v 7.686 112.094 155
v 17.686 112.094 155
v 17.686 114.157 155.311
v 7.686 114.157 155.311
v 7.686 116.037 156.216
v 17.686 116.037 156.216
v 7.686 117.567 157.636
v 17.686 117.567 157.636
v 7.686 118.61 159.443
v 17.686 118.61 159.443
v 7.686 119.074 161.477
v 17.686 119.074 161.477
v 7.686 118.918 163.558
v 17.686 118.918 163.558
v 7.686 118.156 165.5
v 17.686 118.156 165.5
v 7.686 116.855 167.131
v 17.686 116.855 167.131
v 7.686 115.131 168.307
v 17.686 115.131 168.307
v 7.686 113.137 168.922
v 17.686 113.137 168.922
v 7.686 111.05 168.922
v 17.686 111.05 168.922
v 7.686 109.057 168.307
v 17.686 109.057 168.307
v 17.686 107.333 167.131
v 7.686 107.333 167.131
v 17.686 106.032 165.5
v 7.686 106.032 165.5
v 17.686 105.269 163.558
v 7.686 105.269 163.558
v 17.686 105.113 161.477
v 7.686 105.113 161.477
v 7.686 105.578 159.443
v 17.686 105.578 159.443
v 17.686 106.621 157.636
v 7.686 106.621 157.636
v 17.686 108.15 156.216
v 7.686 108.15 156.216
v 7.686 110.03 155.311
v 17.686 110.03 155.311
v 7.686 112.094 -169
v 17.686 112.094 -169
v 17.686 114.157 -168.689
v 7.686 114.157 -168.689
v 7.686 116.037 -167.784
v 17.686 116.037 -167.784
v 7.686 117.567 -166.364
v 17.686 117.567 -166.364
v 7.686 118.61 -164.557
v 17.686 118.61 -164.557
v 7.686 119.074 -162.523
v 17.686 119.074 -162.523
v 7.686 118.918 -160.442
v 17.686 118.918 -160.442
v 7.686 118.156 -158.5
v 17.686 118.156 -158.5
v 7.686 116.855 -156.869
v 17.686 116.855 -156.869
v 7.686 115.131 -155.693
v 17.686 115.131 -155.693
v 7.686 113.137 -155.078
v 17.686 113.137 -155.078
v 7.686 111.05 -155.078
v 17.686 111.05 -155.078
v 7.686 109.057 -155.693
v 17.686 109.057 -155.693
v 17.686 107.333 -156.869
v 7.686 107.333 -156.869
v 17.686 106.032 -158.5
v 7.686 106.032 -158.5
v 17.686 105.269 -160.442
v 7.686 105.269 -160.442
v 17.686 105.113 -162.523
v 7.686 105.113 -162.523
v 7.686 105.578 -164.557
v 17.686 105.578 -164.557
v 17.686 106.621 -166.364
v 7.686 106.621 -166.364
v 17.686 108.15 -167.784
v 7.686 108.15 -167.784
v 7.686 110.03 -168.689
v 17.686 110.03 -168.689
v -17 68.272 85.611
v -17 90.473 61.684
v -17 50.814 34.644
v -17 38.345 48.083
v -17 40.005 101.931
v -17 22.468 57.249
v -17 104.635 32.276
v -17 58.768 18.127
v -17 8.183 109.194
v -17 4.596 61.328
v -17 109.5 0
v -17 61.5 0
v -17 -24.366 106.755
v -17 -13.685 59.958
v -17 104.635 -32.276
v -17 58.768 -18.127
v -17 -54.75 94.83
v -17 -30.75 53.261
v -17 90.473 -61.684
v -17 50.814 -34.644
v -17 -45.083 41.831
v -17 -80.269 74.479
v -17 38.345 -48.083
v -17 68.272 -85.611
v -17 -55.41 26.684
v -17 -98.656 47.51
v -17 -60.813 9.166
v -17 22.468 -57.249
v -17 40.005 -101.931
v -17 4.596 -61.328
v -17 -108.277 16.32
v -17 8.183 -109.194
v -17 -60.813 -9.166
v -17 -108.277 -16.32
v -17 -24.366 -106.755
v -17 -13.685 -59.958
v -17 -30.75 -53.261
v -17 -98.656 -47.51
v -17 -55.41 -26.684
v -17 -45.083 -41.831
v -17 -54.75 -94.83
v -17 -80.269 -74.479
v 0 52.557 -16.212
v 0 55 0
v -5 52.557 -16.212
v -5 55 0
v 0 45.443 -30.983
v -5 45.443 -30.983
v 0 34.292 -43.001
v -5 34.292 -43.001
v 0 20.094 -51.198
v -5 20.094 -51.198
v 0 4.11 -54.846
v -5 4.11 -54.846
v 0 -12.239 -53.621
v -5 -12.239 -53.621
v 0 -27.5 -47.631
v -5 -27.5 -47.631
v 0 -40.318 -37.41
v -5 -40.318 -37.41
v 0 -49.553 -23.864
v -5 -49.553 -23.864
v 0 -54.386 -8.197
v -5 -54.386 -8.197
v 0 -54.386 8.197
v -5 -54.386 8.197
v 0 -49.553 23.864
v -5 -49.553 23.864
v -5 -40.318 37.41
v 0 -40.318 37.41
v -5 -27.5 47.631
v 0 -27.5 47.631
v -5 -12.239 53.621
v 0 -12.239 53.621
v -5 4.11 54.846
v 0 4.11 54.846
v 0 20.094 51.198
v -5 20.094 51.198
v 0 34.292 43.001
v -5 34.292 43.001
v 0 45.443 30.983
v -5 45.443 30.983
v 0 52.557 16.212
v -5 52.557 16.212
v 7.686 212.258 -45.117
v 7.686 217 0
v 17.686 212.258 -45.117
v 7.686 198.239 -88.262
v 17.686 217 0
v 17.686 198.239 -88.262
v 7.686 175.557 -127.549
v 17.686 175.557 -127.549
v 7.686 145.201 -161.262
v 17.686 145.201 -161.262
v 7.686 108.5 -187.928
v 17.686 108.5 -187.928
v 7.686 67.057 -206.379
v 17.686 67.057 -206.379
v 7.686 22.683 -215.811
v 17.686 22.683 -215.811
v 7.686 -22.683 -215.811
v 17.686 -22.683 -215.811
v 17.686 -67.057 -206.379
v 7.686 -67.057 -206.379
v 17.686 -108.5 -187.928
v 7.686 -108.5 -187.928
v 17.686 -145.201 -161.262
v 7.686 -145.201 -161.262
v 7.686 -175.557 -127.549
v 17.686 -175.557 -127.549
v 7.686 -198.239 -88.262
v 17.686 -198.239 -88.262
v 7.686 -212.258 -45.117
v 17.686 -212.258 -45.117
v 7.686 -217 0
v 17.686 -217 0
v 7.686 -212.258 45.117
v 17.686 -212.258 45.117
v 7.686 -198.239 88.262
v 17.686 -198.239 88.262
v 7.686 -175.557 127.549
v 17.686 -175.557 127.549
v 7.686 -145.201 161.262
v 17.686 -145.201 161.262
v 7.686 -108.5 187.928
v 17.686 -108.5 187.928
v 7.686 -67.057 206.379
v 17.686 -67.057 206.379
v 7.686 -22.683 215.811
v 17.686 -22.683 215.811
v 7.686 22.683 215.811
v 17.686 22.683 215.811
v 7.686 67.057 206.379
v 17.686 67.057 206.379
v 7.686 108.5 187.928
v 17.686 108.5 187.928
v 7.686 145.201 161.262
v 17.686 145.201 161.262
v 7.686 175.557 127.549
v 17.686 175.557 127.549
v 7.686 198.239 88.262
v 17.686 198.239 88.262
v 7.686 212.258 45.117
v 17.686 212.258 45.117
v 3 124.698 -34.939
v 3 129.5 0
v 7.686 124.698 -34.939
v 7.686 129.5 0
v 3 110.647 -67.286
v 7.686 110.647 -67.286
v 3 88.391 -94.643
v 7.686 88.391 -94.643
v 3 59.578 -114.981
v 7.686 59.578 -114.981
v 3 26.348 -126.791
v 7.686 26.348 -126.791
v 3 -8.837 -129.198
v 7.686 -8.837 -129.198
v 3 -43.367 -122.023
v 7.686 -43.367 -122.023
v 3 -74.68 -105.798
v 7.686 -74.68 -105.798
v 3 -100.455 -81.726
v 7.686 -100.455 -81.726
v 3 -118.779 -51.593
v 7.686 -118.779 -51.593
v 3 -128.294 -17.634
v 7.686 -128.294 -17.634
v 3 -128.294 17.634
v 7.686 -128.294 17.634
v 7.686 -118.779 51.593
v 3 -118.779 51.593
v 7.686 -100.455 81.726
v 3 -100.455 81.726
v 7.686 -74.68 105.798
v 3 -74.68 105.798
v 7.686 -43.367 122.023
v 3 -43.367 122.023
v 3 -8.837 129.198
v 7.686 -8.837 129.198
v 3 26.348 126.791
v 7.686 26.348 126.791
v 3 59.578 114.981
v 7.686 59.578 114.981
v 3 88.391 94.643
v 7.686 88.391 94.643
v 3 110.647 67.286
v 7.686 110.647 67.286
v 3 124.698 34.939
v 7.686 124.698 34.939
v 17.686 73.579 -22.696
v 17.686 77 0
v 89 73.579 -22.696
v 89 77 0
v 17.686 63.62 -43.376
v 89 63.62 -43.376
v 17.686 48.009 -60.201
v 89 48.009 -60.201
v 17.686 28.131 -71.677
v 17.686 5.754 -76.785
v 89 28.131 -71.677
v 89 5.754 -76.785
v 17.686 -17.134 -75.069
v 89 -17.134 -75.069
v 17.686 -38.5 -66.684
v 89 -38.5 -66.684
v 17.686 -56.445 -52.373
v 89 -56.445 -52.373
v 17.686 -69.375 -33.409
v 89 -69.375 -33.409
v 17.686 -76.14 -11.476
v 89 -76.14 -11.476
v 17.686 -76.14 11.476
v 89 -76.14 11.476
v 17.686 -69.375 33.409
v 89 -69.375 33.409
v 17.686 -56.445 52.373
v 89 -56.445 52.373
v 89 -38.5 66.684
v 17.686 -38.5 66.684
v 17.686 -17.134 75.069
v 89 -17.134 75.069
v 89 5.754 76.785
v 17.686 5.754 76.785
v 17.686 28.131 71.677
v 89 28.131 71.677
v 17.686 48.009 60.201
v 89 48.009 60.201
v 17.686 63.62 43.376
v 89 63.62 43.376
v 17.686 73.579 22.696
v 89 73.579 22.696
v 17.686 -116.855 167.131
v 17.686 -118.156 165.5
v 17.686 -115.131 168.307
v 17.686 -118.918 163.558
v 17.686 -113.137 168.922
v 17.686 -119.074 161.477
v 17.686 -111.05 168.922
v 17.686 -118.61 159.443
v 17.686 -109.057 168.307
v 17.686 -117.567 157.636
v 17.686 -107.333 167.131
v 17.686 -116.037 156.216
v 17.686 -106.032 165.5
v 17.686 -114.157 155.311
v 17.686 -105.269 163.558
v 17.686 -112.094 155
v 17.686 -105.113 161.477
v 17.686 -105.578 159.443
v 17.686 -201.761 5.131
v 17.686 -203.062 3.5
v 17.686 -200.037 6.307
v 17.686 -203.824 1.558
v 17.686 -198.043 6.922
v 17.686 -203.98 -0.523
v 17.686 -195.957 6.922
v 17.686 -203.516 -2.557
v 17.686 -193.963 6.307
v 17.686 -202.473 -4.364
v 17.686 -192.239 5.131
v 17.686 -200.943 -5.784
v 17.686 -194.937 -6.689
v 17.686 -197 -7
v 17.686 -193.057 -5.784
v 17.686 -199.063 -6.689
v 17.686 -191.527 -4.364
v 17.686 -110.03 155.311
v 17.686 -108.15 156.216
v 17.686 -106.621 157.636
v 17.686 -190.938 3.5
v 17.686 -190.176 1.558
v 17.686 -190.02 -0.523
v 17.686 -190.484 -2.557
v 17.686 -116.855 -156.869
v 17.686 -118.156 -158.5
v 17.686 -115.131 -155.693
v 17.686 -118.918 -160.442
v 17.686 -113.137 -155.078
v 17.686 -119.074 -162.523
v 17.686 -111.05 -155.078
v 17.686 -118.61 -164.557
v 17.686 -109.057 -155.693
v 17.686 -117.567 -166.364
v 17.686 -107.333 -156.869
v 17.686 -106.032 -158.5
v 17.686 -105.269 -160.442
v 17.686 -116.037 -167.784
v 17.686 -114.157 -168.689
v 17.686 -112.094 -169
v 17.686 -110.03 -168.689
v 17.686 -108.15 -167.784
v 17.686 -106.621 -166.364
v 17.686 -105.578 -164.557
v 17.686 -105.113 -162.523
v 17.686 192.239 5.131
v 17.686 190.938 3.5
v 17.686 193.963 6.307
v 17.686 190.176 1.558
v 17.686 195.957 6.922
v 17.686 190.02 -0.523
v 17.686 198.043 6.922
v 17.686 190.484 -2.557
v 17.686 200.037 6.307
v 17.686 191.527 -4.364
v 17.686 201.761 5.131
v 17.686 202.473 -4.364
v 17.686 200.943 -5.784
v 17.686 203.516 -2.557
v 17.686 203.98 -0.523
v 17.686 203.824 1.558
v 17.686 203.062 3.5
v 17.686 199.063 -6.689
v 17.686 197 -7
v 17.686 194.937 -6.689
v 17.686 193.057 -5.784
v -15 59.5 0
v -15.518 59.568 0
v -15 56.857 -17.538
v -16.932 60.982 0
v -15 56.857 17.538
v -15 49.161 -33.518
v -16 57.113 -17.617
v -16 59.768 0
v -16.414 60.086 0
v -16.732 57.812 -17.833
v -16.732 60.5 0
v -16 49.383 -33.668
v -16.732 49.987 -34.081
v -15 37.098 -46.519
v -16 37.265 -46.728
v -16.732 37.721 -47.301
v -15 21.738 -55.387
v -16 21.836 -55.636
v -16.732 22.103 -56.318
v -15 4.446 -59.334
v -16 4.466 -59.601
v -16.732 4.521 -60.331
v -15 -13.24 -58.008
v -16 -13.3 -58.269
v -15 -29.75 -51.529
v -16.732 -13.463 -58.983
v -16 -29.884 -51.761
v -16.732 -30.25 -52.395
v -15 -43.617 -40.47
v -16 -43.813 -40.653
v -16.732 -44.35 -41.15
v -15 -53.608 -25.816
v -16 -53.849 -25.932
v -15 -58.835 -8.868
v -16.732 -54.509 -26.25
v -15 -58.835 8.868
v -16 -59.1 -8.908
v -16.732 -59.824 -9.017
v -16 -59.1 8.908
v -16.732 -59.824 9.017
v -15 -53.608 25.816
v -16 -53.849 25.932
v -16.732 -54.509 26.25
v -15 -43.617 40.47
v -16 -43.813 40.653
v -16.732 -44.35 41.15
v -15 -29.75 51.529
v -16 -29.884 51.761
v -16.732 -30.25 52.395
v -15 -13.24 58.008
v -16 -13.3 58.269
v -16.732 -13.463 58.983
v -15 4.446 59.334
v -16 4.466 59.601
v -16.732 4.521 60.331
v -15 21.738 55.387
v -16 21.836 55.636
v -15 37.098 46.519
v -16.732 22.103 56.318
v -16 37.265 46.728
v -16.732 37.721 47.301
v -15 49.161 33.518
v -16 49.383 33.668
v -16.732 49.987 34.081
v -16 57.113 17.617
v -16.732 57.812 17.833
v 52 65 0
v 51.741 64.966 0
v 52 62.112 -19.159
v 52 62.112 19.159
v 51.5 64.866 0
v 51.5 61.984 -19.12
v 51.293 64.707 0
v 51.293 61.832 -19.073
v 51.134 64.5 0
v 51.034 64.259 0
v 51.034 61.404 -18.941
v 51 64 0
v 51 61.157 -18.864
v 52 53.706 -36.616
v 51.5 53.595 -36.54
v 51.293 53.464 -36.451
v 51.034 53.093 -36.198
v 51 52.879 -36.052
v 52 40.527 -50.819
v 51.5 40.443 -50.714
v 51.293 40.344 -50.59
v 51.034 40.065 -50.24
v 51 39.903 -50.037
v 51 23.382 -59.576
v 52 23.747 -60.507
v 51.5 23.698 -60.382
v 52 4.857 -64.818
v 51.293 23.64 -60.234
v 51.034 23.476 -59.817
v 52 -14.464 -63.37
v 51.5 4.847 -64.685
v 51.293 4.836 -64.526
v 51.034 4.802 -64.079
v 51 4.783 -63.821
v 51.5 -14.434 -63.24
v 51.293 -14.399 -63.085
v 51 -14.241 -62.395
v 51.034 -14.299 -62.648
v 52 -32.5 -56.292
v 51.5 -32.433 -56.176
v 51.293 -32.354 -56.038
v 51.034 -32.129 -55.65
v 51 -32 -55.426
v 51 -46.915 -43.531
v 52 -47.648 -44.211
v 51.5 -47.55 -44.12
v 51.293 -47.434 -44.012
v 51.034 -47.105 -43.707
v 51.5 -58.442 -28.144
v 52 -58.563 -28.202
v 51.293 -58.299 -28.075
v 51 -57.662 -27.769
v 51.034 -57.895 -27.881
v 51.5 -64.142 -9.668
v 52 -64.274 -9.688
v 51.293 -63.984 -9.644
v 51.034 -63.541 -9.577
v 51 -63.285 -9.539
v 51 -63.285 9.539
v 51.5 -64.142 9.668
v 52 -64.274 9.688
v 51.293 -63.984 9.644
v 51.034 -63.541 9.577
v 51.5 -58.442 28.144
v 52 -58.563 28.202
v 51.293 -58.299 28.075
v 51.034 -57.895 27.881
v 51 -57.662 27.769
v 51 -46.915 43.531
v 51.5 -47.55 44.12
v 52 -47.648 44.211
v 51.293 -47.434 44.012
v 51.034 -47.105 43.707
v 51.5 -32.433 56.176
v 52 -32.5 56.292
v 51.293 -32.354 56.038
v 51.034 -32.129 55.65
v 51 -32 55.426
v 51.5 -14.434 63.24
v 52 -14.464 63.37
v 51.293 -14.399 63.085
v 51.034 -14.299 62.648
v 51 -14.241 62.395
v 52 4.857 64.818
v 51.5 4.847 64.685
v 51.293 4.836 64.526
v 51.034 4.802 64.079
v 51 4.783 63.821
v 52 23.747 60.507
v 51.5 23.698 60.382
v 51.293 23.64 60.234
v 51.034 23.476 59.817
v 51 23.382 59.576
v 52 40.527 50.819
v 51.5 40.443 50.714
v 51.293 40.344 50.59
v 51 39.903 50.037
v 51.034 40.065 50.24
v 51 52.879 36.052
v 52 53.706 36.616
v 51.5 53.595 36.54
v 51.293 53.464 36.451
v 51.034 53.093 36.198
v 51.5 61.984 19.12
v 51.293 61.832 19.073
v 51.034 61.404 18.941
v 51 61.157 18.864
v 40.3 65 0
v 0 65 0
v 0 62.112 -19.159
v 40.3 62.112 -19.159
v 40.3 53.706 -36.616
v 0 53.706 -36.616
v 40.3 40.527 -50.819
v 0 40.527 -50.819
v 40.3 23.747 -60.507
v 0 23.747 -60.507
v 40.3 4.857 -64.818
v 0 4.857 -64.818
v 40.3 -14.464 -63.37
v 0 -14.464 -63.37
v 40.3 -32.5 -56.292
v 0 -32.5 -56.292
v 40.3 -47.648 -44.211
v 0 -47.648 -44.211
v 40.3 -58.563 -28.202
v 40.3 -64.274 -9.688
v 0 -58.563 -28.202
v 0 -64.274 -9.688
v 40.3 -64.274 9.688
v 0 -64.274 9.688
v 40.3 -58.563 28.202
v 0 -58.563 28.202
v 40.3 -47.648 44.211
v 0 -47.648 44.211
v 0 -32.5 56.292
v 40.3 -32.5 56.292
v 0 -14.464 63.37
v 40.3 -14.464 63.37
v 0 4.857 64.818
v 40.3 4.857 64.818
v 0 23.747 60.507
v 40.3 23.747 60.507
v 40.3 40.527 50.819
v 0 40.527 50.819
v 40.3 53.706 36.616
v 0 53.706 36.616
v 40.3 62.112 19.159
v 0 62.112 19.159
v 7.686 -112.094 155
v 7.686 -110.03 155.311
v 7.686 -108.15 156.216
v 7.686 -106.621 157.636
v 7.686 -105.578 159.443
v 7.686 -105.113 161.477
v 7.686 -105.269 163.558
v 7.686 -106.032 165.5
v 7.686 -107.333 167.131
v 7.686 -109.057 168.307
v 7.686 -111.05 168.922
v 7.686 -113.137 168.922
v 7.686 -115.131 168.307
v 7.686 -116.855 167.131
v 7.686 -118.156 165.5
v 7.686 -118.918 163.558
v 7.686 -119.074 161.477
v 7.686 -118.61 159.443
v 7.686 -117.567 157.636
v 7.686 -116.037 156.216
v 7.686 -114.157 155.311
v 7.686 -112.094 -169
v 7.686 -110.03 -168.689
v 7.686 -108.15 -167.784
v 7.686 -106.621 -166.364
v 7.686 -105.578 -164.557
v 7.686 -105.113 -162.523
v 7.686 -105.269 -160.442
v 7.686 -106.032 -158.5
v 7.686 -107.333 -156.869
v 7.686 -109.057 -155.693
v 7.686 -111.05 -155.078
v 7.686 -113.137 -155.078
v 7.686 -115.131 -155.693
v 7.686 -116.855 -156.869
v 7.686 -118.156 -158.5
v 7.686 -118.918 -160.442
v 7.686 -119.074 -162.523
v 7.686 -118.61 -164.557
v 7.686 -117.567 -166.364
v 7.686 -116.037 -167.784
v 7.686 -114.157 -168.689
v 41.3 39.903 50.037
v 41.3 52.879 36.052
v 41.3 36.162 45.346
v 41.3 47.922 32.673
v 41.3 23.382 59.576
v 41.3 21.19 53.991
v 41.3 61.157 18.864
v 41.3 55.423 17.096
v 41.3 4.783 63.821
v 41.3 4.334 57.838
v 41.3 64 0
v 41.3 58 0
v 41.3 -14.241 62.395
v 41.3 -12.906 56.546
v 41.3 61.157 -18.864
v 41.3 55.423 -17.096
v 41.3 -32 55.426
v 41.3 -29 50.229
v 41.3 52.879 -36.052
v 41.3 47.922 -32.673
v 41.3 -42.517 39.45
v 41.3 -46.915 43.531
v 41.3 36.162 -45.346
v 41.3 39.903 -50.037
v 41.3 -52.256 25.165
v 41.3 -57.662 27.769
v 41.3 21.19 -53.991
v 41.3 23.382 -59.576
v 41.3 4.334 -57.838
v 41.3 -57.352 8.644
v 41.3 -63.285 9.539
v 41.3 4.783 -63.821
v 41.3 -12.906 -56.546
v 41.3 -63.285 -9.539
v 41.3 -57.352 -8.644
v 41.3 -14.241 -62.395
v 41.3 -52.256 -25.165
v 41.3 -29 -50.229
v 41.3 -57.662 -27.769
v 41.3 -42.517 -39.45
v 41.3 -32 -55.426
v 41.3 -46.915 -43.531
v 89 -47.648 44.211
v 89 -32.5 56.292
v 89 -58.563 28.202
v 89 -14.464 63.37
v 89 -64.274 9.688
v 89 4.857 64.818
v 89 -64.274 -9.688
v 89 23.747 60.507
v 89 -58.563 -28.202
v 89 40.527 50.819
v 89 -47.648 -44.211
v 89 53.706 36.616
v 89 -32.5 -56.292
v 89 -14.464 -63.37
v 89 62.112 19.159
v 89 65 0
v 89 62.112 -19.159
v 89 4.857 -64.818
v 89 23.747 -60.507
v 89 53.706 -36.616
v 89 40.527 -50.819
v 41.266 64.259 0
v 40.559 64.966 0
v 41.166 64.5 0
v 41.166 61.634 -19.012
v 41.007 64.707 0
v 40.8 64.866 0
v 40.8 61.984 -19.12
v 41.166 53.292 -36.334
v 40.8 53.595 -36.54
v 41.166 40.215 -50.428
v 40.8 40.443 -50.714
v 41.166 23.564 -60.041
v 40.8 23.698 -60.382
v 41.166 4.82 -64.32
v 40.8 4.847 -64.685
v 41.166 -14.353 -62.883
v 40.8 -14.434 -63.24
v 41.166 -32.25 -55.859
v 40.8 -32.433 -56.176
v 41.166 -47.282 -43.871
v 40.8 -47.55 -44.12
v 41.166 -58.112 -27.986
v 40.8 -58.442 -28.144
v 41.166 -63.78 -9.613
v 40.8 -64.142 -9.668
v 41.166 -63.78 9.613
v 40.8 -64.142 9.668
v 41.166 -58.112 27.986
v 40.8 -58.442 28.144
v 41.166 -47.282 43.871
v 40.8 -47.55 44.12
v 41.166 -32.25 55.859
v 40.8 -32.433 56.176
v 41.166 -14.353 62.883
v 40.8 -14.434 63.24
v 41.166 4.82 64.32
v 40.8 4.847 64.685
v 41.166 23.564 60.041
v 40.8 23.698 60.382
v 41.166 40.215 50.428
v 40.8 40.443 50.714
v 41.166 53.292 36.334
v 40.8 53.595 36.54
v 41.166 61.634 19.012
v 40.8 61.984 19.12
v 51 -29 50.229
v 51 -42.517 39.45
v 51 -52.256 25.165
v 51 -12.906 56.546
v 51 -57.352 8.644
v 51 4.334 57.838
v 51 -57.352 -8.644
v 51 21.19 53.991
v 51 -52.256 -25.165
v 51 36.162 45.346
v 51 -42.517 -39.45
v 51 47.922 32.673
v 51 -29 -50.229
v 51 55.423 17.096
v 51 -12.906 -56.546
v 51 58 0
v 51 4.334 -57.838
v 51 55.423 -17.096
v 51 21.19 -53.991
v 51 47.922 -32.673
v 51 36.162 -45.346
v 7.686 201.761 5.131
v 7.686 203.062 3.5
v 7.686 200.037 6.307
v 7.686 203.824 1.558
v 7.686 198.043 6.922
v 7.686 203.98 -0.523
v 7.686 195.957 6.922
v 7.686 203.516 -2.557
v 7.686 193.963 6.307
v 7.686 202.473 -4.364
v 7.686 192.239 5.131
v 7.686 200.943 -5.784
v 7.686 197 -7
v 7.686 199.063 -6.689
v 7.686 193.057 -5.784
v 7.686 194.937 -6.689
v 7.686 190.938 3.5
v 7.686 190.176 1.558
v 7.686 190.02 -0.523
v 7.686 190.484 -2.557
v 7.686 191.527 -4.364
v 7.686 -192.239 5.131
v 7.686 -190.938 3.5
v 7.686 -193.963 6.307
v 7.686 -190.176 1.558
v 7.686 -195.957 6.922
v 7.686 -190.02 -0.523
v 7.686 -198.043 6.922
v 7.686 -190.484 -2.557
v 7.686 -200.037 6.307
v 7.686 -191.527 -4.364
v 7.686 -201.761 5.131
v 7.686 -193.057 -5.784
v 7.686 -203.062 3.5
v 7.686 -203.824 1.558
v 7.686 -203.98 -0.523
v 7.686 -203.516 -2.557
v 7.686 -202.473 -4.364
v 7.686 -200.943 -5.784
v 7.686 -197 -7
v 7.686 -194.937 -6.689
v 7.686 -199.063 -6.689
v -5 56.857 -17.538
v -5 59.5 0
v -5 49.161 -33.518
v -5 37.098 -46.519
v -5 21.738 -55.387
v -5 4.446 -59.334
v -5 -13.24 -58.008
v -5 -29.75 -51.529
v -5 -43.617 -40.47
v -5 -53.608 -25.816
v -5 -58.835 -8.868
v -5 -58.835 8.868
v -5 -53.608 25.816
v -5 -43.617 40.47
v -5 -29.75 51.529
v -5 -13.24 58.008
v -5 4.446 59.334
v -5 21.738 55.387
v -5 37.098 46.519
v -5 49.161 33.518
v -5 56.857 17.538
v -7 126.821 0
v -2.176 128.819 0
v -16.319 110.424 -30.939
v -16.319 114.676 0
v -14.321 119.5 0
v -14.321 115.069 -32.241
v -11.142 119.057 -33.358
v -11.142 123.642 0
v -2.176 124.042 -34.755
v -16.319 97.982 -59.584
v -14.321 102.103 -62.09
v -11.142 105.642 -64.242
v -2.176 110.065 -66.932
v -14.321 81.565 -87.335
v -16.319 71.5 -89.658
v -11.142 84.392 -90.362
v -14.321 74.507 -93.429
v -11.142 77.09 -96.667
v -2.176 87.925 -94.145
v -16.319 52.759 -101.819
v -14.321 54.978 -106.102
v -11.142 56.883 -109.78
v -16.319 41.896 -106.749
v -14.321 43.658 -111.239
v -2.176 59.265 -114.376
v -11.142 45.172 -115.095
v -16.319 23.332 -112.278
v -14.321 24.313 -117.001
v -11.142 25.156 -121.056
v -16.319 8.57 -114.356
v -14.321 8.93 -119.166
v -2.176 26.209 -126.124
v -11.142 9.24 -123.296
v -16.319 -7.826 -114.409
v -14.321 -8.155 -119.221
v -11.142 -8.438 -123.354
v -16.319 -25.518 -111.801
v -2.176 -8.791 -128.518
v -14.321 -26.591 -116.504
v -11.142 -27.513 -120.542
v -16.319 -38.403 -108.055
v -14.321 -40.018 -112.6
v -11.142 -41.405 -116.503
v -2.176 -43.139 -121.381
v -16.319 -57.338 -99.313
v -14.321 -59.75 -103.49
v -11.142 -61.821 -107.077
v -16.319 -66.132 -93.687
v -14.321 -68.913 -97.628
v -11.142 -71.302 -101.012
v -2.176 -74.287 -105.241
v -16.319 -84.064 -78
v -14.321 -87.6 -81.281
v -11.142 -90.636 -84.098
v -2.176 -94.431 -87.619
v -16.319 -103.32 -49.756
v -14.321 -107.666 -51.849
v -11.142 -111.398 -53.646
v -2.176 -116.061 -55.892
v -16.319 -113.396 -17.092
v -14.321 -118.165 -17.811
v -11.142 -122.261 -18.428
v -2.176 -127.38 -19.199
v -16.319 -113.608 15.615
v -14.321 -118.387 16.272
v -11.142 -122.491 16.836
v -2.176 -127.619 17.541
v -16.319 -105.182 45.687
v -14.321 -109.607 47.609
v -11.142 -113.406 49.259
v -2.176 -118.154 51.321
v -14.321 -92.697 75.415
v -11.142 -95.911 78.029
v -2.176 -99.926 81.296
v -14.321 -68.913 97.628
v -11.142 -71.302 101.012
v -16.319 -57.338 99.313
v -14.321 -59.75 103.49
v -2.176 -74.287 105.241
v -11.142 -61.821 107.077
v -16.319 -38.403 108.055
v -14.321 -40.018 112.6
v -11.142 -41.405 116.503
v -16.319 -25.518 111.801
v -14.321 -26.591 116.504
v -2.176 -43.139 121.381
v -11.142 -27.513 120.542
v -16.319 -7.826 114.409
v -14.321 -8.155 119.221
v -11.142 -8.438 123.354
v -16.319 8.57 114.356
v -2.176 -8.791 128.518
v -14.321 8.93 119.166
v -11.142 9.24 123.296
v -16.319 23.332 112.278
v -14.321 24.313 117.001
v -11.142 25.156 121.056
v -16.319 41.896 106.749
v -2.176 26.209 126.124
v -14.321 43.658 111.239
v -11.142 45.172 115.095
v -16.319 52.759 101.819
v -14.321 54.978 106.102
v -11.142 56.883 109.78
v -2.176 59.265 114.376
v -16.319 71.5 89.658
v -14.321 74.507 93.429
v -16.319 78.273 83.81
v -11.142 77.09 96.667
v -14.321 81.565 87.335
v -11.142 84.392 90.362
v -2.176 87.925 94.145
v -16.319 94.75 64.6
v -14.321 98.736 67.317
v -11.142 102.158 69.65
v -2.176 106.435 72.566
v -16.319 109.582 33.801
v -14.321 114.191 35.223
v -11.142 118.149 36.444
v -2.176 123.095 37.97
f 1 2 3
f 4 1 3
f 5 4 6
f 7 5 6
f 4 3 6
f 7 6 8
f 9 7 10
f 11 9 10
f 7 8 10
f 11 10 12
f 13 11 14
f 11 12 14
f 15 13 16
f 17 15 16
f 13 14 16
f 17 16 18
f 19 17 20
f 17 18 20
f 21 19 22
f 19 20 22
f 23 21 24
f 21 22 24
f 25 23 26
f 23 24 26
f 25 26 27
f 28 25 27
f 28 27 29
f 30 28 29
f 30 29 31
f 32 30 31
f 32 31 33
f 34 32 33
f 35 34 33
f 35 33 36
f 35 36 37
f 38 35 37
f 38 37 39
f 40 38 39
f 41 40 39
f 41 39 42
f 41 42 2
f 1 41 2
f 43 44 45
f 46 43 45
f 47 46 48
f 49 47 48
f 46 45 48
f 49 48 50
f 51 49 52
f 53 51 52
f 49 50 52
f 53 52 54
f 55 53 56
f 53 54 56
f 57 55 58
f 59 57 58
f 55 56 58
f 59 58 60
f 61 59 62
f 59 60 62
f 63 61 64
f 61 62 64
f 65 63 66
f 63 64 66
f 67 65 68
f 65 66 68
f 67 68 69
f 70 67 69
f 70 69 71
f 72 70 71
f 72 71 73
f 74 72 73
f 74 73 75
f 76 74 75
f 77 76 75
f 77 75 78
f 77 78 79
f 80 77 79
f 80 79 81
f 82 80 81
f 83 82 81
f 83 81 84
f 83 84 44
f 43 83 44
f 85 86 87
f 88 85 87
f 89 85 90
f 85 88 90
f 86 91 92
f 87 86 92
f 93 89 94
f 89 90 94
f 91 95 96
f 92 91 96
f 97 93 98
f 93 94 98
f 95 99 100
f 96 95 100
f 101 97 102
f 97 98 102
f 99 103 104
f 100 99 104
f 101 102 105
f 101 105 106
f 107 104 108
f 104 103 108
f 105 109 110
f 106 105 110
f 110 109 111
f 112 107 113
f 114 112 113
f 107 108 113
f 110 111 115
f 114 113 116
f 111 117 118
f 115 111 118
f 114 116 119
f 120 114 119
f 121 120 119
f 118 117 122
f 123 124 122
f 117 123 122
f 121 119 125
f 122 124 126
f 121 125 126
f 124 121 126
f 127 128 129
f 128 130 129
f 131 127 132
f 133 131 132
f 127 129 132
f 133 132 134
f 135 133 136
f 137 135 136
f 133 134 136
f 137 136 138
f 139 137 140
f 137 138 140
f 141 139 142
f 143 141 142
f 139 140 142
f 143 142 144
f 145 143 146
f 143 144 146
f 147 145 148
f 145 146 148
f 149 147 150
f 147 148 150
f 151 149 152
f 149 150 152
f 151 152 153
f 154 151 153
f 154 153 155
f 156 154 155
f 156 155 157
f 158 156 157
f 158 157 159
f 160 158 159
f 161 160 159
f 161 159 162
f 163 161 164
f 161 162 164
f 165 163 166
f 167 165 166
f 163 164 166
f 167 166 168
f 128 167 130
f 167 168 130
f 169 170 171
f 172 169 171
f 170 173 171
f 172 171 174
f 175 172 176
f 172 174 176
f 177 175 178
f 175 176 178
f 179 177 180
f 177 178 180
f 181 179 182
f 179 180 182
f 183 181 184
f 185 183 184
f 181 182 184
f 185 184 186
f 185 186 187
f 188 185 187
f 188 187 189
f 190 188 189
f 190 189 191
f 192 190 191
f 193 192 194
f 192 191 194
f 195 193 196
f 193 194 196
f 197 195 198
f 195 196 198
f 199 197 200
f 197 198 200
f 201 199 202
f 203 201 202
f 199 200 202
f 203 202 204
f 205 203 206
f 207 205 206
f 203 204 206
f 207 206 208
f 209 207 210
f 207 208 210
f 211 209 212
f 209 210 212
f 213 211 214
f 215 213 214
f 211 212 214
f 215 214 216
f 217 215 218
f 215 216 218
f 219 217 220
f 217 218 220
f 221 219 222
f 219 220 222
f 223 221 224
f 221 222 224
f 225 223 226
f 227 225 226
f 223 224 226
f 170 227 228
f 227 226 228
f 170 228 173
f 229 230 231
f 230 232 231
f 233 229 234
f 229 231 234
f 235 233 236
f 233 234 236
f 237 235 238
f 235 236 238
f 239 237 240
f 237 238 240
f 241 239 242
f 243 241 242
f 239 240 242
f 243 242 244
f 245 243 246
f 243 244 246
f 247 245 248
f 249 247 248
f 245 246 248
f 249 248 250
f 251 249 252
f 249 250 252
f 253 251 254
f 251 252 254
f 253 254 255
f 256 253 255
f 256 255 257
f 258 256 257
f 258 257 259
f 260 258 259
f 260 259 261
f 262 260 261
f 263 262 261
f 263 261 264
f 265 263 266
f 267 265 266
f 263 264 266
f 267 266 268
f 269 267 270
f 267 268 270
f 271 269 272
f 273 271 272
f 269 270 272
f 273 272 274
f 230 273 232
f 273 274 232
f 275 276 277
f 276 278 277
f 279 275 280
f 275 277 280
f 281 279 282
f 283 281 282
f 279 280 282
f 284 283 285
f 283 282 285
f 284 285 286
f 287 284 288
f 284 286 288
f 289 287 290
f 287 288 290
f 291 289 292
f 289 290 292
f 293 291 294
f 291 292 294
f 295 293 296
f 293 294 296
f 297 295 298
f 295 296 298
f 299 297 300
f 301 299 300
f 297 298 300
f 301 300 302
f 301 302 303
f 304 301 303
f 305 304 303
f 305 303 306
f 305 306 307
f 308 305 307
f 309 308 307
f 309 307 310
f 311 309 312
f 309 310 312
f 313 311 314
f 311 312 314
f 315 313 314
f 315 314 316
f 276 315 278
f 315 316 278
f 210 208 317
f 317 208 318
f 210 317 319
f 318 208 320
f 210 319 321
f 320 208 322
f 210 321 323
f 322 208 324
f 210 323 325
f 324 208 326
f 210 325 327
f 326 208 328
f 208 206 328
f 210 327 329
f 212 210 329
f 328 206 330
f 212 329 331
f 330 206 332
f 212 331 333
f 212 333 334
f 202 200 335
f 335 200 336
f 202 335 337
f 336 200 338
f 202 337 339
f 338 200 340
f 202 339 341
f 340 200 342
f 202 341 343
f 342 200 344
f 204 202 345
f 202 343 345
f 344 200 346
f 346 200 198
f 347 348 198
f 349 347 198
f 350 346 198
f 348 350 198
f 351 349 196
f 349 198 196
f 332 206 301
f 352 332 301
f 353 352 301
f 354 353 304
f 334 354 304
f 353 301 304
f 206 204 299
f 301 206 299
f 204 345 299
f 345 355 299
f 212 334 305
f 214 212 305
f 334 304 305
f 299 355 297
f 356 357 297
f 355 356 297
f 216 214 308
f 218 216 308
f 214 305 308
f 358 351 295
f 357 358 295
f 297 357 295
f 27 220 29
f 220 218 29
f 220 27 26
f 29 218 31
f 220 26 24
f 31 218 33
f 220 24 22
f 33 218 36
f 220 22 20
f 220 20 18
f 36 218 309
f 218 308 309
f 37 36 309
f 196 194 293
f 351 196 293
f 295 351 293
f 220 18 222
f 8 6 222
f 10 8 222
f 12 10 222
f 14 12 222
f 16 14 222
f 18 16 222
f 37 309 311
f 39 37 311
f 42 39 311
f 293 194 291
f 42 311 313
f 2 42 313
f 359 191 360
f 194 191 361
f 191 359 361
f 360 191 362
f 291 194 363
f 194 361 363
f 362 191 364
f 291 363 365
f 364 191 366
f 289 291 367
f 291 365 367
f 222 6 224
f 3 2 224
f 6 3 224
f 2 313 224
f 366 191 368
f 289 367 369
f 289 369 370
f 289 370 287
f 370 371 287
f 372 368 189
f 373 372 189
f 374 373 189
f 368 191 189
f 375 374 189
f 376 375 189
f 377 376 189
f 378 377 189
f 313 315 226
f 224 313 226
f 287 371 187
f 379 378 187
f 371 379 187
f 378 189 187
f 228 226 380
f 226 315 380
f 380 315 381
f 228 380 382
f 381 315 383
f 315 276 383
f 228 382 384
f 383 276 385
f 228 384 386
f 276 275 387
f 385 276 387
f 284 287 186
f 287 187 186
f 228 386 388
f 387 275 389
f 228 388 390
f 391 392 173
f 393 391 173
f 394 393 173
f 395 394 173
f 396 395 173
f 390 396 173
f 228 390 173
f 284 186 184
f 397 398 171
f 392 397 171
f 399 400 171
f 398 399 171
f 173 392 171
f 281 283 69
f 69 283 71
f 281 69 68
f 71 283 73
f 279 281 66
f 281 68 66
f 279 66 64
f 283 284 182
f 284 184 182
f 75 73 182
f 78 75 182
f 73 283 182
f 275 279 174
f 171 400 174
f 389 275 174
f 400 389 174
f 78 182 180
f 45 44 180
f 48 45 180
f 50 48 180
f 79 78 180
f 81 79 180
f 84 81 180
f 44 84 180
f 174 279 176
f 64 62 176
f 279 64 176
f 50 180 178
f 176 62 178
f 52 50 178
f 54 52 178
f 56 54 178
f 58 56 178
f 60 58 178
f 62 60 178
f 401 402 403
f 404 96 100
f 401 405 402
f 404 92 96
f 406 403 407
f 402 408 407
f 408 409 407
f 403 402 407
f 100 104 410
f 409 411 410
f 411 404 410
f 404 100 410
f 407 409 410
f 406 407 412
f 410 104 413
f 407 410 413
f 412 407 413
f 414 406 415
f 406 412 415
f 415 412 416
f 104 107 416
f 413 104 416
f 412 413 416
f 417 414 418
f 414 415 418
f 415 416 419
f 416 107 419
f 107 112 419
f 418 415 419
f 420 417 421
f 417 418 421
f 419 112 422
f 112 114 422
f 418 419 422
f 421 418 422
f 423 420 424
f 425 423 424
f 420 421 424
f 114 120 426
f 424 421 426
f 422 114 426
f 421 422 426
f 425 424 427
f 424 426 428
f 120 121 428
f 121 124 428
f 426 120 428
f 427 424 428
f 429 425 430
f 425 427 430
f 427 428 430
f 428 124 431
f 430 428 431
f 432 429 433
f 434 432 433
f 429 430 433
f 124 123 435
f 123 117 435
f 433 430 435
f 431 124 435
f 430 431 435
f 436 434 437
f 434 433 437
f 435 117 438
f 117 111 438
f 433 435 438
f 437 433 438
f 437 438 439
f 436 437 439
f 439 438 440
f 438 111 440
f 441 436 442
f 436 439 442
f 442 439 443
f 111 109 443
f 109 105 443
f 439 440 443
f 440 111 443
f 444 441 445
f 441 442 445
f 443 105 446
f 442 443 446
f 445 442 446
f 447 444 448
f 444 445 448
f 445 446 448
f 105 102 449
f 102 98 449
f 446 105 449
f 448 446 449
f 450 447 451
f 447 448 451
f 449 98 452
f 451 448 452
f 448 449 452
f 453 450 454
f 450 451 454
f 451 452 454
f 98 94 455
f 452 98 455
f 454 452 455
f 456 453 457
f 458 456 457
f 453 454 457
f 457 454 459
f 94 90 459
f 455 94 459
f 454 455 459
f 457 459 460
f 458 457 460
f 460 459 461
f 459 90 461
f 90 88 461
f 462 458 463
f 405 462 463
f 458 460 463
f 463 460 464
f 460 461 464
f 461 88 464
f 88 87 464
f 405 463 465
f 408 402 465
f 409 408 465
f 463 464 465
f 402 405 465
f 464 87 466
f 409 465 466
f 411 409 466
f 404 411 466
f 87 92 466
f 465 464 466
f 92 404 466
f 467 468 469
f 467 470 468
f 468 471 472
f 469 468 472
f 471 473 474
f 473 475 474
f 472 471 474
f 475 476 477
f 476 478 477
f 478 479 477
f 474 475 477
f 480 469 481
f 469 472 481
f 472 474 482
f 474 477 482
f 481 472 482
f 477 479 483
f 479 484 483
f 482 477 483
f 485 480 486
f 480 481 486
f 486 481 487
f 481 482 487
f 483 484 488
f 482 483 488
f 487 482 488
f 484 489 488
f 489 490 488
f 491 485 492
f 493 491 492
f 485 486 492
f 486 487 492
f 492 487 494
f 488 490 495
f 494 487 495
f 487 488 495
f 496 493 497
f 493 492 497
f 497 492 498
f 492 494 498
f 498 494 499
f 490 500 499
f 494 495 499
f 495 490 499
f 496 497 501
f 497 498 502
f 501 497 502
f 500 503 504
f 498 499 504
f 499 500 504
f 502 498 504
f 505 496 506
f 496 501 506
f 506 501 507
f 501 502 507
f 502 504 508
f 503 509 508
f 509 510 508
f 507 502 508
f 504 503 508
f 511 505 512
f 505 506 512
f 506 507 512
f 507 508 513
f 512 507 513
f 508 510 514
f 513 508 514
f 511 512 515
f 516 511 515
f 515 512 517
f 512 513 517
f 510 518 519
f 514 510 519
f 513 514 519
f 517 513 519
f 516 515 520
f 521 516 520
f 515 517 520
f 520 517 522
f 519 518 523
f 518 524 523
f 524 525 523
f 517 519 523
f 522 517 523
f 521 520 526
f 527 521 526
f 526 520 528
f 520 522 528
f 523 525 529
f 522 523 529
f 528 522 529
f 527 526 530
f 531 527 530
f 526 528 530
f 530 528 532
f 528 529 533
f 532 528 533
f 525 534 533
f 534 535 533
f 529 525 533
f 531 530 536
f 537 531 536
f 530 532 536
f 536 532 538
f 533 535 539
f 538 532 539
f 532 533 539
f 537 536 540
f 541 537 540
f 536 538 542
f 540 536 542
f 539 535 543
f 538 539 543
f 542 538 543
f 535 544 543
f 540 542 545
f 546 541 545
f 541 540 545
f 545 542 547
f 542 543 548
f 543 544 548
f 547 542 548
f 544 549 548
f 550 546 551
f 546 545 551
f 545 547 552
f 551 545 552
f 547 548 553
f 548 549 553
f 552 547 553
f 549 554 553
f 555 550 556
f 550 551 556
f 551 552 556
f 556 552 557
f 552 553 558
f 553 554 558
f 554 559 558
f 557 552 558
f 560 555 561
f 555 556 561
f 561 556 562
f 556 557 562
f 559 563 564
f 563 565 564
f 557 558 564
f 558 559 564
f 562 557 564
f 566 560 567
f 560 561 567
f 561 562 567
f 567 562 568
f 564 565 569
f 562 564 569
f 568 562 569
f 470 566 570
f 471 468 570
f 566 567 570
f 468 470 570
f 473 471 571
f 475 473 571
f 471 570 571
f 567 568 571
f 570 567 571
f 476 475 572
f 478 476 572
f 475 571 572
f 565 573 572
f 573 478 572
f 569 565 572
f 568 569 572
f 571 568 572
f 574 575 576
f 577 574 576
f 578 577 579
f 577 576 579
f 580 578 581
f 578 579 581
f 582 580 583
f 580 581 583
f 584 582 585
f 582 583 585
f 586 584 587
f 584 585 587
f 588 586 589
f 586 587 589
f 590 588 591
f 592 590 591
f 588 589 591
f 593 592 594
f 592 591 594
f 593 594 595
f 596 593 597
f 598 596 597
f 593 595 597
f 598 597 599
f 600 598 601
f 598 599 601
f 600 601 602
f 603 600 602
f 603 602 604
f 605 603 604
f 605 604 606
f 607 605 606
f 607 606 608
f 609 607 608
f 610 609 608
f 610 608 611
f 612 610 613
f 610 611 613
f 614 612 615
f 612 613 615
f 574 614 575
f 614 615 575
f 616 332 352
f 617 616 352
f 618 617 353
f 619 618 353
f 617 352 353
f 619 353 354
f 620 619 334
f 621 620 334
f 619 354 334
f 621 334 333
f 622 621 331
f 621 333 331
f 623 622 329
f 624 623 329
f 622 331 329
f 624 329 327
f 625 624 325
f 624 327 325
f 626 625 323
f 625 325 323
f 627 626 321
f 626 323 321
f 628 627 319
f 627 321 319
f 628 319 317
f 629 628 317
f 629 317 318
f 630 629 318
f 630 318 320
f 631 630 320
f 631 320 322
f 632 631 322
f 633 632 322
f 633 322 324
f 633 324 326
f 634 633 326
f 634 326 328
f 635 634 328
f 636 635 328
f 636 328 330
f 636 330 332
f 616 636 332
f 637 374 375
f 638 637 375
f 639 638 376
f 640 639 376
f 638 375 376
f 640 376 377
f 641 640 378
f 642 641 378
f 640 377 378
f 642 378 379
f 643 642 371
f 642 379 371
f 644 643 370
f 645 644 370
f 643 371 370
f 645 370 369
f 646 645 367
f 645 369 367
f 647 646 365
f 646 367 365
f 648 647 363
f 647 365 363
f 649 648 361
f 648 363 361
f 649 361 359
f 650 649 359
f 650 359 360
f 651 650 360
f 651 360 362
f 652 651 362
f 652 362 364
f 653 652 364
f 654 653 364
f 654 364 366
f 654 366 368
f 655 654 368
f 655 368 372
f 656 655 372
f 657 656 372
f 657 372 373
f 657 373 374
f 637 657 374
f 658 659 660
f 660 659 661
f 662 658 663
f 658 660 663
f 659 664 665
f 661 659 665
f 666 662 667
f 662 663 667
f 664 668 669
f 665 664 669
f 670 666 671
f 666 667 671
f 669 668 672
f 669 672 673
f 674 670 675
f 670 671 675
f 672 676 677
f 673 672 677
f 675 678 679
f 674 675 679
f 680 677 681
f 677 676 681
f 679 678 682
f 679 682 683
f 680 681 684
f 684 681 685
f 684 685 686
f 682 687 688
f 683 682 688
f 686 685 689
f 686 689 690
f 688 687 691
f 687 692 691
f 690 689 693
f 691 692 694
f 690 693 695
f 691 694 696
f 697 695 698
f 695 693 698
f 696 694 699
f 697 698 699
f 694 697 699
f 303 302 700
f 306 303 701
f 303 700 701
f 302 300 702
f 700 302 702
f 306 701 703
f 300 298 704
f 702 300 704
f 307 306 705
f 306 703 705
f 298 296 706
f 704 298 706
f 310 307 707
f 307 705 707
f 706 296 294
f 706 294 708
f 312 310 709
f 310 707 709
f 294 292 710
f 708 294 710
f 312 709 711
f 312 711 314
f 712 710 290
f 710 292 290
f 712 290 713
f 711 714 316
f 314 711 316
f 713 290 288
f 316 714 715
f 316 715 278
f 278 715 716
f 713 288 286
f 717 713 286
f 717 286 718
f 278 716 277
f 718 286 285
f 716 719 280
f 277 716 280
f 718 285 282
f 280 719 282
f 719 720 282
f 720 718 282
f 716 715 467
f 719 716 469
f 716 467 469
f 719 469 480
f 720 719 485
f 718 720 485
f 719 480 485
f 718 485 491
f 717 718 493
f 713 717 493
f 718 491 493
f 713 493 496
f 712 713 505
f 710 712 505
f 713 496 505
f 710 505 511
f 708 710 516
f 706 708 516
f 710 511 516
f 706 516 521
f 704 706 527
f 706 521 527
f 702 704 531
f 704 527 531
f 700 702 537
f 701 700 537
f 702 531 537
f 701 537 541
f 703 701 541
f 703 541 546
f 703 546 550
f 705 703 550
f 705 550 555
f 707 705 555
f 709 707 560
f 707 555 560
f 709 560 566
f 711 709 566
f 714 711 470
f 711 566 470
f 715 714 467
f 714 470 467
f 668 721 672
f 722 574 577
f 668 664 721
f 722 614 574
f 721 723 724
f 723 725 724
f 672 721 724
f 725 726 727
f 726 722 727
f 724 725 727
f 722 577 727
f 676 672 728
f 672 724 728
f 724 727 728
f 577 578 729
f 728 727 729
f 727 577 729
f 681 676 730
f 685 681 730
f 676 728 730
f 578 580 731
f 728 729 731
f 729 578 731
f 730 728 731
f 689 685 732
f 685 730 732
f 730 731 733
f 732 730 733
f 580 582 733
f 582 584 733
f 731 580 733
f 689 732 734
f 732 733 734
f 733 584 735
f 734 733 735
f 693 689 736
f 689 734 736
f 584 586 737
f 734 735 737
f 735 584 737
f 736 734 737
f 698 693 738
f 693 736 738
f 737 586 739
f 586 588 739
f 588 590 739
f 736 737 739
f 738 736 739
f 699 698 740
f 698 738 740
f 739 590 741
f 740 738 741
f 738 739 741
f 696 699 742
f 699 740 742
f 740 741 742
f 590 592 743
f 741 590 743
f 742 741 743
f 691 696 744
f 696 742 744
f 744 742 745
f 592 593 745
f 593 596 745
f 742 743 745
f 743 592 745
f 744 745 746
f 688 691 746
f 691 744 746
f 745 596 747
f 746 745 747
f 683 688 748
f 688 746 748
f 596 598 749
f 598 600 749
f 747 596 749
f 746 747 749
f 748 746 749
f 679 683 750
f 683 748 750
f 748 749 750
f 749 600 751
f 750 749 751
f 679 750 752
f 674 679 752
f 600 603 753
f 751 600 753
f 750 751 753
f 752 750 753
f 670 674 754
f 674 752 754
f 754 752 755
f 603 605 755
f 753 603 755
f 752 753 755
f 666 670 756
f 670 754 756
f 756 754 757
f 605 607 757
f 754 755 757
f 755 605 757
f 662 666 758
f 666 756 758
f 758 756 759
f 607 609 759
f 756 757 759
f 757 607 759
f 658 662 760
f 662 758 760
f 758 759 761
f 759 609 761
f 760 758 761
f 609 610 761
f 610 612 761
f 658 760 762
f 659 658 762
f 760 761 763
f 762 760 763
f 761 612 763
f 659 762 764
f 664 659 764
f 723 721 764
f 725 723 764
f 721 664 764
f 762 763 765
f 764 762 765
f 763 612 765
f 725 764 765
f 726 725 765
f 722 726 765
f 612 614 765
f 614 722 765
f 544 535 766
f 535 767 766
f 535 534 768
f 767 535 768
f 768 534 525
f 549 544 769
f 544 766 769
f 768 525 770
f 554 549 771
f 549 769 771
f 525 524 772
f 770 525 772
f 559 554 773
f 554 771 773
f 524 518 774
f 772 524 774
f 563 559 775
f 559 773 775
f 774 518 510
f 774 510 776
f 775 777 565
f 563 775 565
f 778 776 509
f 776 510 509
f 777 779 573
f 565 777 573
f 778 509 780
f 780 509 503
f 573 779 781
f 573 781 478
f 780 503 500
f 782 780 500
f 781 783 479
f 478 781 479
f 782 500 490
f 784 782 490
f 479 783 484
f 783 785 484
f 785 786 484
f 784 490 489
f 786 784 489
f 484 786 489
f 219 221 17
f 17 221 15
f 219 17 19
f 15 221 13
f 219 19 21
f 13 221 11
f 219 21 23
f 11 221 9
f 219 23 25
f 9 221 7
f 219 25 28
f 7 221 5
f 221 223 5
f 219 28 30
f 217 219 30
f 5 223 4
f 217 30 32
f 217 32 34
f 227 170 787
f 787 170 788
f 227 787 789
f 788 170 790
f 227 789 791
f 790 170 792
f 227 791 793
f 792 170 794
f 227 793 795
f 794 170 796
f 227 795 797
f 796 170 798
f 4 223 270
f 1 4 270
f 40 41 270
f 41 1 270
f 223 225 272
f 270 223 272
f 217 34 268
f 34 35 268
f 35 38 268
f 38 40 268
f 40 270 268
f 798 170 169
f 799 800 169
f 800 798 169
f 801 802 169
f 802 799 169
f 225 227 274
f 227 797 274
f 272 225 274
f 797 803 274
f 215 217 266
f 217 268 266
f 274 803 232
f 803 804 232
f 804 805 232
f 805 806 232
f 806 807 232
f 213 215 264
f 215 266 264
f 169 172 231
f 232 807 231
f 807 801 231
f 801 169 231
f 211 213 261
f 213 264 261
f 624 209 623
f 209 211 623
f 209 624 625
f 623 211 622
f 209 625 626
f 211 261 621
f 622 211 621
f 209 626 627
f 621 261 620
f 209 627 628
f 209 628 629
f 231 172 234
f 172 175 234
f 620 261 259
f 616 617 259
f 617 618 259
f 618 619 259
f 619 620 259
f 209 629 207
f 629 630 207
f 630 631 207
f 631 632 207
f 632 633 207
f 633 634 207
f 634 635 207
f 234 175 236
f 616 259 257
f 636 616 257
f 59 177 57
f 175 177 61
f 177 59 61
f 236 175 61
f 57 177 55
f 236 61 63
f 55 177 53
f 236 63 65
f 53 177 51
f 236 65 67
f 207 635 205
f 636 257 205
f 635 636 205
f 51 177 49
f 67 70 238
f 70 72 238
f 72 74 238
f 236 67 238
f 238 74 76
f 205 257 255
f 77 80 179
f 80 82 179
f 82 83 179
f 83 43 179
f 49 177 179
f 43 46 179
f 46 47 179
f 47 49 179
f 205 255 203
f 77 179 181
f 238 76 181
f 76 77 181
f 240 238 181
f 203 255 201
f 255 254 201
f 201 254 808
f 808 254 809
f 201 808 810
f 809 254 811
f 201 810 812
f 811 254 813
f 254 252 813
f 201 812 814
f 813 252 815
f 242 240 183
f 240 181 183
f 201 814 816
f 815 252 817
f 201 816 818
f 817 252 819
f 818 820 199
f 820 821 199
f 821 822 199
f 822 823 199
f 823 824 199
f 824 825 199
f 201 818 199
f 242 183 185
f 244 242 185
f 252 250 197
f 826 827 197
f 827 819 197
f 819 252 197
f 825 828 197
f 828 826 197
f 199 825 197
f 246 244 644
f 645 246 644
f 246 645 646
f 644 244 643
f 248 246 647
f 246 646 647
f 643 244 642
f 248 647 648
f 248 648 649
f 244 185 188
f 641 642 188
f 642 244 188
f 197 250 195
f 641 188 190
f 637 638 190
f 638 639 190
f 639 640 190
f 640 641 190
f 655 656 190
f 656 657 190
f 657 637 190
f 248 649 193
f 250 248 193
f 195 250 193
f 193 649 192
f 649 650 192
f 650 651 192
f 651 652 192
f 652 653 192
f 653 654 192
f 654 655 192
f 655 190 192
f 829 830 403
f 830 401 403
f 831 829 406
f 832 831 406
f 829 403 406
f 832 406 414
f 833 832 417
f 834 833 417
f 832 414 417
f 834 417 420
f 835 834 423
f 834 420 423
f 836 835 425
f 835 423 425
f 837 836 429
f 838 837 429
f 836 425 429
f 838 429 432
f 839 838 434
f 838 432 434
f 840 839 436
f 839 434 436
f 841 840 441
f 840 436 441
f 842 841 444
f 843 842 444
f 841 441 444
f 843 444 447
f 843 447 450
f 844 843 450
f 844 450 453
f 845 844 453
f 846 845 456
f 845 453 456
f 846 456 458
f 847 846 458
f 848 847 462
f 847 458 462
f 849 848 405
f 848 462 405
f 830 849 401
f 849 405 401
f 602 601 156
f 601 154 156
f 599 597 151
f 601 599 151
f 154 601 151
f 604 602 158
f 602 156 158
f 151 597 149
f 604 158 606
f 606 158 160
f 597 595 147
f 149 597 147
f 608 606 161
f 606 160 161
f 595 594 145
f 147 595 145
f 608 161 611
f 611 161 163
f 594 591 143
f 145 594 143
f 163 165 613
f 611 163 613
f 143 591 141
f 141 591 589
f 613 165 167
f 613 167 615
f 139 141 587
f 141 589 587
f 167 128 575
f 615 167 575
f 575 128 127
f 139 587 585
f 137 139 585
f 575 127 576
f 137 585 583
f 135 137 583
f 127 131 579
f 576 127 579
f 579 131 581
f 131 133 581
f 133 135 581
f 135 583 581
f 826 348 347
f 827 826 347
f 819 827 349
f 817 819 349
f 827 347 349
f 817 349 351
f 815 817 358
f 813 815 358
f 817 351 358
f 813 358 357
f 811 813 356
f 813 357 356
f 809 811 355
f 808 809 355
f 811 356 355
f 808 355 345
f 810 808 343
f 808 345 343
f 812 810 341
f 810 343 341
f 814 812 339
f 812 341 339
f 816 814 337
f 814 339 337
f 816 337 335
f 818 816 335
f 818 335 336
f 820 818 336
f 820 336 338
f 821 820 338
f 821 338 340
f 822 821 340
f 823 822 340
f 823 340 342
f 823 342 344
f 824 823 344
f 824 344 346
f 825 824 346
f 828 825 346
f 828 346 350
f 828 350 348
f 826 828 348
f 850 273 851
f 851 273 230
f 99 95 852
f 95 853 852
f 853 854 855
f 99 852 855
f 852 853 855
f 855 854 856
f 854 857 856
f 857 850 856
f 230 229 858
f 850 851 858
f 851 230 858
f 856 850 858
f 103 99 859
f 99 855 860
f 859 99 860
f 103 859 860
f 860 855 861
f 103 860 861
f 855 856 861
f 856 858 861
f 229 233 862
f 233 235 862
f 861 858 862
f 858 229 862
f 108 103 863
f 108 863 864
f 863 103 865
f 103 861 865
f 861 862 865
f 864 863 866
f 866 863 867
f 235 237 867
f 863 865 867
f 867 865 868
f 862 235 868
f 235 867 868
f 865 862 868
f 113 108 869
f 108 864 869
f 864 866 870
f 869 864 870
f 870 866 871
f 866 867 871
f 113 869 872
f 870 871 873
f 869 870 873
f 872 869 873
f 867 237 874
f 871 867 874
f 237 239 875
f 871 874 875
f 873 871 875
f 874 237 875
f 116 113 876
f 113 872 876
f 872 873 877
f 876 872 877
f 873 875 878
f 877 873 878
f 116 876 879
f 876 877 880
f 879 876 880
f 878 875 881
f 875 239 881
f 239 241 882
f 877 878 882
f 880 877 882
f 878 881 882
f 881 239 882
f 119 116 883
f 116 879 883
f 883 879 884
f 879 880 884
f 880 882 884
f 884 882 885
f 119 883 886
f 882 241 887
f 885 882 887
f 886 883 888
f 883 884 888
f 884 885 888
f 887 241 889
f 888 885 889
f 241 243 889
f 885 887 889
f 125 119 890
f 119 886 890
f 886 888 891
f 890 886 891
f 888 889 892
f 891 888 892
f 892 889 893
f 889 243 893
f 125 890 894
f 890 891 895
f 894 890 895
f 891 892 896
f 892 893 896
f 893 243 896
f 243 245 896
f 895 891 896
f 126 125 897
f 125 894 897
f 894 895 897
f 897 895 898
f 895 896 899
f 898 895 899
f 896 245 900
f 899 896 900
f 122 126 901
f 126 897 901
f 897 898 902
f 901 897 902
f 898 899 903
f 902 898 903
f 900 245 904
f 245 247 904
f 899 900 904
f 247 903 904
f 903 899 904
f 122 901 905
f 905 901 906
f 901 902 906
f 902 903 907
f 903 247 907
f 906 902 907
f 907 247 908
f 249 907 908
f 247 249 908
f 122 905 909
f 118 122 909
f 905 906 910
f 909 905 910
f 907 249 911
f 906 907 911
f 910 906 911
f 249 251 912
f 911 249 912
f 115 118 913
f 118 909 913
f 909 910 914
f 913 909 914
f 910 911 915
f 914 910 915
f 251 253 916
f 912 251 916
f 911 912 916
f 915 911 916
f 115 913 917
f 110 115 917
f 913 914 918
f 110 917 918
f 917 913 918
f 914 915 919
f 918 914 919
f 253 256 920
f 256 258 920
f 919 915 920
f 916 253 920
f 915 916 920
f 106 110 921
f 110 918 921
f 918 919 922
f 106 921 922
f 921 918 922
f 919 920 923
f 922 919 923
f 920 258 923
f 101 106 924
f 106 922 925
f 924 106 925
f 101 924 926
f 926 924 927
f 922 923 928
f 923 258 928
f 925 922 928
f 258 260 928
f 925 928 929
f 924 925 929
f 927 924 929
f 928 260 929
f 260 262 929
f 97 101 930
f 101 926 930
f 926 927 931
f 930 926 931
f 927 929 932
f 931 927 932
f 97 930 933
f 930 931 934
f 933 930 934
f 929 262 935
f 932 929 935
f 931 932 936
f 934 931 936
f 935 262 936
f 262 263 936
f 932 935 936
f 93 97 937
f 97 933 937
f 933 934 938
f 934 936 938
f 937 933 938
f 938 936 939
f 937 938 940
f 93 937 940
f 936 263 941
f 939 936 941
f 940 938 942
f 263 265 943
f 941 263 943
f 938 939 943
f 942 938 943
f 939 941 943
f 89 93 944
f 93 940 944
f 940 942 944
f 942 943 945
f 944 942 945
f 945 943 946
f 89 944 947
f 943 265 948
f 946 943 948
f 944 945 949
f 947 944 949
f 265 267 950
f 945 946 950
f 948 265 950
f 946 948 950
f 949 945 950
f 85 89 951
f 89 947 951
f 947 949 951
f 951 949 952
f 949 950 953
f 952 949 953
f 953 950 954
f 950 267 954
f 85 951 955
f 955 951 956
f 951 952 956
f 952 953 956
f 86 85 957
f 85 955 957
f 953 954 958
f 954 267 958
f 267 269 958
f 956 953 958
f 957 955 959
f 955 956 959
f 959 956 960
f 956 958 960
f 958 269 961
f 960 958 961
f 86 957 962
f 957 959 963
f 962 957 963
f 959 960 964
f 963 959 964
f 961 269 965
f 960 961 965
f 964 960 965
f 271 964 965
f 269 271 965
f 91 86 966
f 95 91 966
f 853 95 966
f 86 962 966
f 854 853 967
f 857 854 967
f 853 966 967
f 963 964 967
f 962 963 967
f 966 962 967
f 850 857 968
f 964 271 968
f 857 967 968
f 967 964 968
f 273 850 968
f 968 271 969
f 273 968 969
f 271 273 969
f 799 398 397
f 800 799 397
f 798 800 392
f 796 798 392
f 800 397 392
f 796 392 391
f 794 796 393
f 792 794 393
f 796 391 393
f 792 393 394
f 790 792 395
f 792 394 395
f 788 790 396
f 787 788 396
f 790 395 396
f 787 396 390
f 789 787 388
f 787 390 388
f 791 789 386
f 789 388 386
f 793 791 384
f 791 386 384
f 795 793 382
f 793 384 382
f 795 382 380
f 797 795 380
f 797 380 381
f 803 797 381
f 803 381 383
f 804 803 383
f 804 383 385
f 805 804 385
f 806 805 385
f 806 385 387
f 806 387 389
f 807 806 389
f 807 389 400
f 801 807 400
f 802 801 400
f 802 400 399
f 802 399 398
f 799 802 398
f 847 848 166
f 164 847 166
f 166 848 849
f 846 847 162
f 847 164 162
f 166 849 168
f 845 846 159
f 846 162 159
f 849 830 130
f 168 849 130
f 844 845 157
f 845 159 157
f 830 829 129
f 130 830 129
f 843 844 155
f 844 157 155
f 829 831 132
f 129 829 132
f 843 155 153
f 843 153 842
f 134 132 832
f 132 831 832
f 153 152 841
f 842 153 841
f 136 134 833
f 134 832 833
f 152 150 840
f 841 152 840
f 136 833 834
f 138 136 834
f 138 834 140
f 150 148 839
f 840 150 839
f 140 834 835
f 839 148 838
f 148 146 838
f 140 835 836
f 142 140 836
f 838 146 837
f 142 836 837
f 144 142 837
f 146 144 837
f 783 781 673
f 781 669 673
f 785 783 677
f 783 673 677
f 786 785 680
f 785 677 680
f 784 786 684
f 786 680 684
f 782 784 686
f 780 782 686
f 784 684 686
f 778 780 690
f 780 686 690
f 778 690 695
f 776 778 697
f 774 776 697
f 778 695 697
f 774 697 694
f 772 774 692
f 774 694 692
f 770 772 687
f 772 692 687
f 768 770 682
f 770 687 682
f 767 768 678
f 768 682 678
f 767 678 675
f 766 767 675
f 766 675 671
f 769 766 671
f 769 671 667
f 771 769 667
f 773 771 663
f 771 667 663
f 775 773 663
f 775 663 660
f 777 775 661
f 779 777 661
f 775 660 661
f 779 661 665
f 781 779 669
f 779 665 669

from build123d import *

# Parameters (mm, degrees)
FILLET1_R                  = 1
M16X2_0_TAPPED_HOLE1_D     = 14
M16X2_0_TAPPED_HOLE1_DEPTH = 38
M16X2_0_TAPPED_HOLE1_TIP   = 4.206024333


with BuildPart() as part:
    # Sketch1 → Revolve1 (revolve)
    with BuildSketch(Plane.XY):
        with BuildLine():
            Line((89, 65), (51, 65))
            Line((51, 65), (51, 58))
            Line((51, 58), (41.3, 58))
            Line((41.3, 58), (41.3, 65))
            Line((41.3, 65), (0, 65))
            Line((0, 65), (0, 55))
            Line((0, 55), (-5, 55))
            Line((-5, 55), (-5, 59.5))
            Line((-5, 59.5), (-15, 59.5))
            ThreePointArc((-15, 59.5), (-16.414213562, 60.085786438), (-17, 61.5))
            Line((-17, 61.5), (-17, 109.5))
            ThreePointArc((-17, 109.5), (-11.142135624, 123.642135624), (3, 129.5))
            Line((3, 129.5), (7.686032459, 129.5))
            Line((7.686032459, 129.5), (7.686032459, 217))
            Line((7.686032459, 217), (17.686032459, 217))
            Line((17.686032459, 217), (17.686032459, 77))
            Line((17.686032459, 77), (89, 77))
            Line((89, 77), (89, 65))
        make_face()
    revolve(axis=Axis((131.481481481, 0, 0), (-1, 0, 0)))

    # Fillet1
    fillet1_edges = [part.edges().sort_by_distance(p)[0] for p in [
        (41.3, -65, 0),
        (51, -65, 0),
    ]]
    fillet(fillet1_edges, radius=FILLET1_R)

    # M16x2.0 Tapped Hole1
    with Locations(Plane.ZY.offset(-7.686032459)):
        with Locations((0, 197), (0, -197), (162, -112.093710796), (-162, -112.093710796), (-162, 112.093710796), (162, 112.093710796)):
            Hole(M16X2_0_TAPPED_HOLE1_D / 2, depth=M16X2_0_TAPPED_HOLE1_DEPTH)
            with Locations((0, 0, -(M16X2_0_TAPPED_HOLE1_DEPTH + M16X2_0_TAPPED_HOLE1_TIP / 2))):  # 118° drill point
                Cone(0, M16X2_0_TAPPED_HOLE1_D / 2, M16X2_0_TAPPED_HOLE1_TIP, mode=Mode.SUBTRACT)


solid = part.part
